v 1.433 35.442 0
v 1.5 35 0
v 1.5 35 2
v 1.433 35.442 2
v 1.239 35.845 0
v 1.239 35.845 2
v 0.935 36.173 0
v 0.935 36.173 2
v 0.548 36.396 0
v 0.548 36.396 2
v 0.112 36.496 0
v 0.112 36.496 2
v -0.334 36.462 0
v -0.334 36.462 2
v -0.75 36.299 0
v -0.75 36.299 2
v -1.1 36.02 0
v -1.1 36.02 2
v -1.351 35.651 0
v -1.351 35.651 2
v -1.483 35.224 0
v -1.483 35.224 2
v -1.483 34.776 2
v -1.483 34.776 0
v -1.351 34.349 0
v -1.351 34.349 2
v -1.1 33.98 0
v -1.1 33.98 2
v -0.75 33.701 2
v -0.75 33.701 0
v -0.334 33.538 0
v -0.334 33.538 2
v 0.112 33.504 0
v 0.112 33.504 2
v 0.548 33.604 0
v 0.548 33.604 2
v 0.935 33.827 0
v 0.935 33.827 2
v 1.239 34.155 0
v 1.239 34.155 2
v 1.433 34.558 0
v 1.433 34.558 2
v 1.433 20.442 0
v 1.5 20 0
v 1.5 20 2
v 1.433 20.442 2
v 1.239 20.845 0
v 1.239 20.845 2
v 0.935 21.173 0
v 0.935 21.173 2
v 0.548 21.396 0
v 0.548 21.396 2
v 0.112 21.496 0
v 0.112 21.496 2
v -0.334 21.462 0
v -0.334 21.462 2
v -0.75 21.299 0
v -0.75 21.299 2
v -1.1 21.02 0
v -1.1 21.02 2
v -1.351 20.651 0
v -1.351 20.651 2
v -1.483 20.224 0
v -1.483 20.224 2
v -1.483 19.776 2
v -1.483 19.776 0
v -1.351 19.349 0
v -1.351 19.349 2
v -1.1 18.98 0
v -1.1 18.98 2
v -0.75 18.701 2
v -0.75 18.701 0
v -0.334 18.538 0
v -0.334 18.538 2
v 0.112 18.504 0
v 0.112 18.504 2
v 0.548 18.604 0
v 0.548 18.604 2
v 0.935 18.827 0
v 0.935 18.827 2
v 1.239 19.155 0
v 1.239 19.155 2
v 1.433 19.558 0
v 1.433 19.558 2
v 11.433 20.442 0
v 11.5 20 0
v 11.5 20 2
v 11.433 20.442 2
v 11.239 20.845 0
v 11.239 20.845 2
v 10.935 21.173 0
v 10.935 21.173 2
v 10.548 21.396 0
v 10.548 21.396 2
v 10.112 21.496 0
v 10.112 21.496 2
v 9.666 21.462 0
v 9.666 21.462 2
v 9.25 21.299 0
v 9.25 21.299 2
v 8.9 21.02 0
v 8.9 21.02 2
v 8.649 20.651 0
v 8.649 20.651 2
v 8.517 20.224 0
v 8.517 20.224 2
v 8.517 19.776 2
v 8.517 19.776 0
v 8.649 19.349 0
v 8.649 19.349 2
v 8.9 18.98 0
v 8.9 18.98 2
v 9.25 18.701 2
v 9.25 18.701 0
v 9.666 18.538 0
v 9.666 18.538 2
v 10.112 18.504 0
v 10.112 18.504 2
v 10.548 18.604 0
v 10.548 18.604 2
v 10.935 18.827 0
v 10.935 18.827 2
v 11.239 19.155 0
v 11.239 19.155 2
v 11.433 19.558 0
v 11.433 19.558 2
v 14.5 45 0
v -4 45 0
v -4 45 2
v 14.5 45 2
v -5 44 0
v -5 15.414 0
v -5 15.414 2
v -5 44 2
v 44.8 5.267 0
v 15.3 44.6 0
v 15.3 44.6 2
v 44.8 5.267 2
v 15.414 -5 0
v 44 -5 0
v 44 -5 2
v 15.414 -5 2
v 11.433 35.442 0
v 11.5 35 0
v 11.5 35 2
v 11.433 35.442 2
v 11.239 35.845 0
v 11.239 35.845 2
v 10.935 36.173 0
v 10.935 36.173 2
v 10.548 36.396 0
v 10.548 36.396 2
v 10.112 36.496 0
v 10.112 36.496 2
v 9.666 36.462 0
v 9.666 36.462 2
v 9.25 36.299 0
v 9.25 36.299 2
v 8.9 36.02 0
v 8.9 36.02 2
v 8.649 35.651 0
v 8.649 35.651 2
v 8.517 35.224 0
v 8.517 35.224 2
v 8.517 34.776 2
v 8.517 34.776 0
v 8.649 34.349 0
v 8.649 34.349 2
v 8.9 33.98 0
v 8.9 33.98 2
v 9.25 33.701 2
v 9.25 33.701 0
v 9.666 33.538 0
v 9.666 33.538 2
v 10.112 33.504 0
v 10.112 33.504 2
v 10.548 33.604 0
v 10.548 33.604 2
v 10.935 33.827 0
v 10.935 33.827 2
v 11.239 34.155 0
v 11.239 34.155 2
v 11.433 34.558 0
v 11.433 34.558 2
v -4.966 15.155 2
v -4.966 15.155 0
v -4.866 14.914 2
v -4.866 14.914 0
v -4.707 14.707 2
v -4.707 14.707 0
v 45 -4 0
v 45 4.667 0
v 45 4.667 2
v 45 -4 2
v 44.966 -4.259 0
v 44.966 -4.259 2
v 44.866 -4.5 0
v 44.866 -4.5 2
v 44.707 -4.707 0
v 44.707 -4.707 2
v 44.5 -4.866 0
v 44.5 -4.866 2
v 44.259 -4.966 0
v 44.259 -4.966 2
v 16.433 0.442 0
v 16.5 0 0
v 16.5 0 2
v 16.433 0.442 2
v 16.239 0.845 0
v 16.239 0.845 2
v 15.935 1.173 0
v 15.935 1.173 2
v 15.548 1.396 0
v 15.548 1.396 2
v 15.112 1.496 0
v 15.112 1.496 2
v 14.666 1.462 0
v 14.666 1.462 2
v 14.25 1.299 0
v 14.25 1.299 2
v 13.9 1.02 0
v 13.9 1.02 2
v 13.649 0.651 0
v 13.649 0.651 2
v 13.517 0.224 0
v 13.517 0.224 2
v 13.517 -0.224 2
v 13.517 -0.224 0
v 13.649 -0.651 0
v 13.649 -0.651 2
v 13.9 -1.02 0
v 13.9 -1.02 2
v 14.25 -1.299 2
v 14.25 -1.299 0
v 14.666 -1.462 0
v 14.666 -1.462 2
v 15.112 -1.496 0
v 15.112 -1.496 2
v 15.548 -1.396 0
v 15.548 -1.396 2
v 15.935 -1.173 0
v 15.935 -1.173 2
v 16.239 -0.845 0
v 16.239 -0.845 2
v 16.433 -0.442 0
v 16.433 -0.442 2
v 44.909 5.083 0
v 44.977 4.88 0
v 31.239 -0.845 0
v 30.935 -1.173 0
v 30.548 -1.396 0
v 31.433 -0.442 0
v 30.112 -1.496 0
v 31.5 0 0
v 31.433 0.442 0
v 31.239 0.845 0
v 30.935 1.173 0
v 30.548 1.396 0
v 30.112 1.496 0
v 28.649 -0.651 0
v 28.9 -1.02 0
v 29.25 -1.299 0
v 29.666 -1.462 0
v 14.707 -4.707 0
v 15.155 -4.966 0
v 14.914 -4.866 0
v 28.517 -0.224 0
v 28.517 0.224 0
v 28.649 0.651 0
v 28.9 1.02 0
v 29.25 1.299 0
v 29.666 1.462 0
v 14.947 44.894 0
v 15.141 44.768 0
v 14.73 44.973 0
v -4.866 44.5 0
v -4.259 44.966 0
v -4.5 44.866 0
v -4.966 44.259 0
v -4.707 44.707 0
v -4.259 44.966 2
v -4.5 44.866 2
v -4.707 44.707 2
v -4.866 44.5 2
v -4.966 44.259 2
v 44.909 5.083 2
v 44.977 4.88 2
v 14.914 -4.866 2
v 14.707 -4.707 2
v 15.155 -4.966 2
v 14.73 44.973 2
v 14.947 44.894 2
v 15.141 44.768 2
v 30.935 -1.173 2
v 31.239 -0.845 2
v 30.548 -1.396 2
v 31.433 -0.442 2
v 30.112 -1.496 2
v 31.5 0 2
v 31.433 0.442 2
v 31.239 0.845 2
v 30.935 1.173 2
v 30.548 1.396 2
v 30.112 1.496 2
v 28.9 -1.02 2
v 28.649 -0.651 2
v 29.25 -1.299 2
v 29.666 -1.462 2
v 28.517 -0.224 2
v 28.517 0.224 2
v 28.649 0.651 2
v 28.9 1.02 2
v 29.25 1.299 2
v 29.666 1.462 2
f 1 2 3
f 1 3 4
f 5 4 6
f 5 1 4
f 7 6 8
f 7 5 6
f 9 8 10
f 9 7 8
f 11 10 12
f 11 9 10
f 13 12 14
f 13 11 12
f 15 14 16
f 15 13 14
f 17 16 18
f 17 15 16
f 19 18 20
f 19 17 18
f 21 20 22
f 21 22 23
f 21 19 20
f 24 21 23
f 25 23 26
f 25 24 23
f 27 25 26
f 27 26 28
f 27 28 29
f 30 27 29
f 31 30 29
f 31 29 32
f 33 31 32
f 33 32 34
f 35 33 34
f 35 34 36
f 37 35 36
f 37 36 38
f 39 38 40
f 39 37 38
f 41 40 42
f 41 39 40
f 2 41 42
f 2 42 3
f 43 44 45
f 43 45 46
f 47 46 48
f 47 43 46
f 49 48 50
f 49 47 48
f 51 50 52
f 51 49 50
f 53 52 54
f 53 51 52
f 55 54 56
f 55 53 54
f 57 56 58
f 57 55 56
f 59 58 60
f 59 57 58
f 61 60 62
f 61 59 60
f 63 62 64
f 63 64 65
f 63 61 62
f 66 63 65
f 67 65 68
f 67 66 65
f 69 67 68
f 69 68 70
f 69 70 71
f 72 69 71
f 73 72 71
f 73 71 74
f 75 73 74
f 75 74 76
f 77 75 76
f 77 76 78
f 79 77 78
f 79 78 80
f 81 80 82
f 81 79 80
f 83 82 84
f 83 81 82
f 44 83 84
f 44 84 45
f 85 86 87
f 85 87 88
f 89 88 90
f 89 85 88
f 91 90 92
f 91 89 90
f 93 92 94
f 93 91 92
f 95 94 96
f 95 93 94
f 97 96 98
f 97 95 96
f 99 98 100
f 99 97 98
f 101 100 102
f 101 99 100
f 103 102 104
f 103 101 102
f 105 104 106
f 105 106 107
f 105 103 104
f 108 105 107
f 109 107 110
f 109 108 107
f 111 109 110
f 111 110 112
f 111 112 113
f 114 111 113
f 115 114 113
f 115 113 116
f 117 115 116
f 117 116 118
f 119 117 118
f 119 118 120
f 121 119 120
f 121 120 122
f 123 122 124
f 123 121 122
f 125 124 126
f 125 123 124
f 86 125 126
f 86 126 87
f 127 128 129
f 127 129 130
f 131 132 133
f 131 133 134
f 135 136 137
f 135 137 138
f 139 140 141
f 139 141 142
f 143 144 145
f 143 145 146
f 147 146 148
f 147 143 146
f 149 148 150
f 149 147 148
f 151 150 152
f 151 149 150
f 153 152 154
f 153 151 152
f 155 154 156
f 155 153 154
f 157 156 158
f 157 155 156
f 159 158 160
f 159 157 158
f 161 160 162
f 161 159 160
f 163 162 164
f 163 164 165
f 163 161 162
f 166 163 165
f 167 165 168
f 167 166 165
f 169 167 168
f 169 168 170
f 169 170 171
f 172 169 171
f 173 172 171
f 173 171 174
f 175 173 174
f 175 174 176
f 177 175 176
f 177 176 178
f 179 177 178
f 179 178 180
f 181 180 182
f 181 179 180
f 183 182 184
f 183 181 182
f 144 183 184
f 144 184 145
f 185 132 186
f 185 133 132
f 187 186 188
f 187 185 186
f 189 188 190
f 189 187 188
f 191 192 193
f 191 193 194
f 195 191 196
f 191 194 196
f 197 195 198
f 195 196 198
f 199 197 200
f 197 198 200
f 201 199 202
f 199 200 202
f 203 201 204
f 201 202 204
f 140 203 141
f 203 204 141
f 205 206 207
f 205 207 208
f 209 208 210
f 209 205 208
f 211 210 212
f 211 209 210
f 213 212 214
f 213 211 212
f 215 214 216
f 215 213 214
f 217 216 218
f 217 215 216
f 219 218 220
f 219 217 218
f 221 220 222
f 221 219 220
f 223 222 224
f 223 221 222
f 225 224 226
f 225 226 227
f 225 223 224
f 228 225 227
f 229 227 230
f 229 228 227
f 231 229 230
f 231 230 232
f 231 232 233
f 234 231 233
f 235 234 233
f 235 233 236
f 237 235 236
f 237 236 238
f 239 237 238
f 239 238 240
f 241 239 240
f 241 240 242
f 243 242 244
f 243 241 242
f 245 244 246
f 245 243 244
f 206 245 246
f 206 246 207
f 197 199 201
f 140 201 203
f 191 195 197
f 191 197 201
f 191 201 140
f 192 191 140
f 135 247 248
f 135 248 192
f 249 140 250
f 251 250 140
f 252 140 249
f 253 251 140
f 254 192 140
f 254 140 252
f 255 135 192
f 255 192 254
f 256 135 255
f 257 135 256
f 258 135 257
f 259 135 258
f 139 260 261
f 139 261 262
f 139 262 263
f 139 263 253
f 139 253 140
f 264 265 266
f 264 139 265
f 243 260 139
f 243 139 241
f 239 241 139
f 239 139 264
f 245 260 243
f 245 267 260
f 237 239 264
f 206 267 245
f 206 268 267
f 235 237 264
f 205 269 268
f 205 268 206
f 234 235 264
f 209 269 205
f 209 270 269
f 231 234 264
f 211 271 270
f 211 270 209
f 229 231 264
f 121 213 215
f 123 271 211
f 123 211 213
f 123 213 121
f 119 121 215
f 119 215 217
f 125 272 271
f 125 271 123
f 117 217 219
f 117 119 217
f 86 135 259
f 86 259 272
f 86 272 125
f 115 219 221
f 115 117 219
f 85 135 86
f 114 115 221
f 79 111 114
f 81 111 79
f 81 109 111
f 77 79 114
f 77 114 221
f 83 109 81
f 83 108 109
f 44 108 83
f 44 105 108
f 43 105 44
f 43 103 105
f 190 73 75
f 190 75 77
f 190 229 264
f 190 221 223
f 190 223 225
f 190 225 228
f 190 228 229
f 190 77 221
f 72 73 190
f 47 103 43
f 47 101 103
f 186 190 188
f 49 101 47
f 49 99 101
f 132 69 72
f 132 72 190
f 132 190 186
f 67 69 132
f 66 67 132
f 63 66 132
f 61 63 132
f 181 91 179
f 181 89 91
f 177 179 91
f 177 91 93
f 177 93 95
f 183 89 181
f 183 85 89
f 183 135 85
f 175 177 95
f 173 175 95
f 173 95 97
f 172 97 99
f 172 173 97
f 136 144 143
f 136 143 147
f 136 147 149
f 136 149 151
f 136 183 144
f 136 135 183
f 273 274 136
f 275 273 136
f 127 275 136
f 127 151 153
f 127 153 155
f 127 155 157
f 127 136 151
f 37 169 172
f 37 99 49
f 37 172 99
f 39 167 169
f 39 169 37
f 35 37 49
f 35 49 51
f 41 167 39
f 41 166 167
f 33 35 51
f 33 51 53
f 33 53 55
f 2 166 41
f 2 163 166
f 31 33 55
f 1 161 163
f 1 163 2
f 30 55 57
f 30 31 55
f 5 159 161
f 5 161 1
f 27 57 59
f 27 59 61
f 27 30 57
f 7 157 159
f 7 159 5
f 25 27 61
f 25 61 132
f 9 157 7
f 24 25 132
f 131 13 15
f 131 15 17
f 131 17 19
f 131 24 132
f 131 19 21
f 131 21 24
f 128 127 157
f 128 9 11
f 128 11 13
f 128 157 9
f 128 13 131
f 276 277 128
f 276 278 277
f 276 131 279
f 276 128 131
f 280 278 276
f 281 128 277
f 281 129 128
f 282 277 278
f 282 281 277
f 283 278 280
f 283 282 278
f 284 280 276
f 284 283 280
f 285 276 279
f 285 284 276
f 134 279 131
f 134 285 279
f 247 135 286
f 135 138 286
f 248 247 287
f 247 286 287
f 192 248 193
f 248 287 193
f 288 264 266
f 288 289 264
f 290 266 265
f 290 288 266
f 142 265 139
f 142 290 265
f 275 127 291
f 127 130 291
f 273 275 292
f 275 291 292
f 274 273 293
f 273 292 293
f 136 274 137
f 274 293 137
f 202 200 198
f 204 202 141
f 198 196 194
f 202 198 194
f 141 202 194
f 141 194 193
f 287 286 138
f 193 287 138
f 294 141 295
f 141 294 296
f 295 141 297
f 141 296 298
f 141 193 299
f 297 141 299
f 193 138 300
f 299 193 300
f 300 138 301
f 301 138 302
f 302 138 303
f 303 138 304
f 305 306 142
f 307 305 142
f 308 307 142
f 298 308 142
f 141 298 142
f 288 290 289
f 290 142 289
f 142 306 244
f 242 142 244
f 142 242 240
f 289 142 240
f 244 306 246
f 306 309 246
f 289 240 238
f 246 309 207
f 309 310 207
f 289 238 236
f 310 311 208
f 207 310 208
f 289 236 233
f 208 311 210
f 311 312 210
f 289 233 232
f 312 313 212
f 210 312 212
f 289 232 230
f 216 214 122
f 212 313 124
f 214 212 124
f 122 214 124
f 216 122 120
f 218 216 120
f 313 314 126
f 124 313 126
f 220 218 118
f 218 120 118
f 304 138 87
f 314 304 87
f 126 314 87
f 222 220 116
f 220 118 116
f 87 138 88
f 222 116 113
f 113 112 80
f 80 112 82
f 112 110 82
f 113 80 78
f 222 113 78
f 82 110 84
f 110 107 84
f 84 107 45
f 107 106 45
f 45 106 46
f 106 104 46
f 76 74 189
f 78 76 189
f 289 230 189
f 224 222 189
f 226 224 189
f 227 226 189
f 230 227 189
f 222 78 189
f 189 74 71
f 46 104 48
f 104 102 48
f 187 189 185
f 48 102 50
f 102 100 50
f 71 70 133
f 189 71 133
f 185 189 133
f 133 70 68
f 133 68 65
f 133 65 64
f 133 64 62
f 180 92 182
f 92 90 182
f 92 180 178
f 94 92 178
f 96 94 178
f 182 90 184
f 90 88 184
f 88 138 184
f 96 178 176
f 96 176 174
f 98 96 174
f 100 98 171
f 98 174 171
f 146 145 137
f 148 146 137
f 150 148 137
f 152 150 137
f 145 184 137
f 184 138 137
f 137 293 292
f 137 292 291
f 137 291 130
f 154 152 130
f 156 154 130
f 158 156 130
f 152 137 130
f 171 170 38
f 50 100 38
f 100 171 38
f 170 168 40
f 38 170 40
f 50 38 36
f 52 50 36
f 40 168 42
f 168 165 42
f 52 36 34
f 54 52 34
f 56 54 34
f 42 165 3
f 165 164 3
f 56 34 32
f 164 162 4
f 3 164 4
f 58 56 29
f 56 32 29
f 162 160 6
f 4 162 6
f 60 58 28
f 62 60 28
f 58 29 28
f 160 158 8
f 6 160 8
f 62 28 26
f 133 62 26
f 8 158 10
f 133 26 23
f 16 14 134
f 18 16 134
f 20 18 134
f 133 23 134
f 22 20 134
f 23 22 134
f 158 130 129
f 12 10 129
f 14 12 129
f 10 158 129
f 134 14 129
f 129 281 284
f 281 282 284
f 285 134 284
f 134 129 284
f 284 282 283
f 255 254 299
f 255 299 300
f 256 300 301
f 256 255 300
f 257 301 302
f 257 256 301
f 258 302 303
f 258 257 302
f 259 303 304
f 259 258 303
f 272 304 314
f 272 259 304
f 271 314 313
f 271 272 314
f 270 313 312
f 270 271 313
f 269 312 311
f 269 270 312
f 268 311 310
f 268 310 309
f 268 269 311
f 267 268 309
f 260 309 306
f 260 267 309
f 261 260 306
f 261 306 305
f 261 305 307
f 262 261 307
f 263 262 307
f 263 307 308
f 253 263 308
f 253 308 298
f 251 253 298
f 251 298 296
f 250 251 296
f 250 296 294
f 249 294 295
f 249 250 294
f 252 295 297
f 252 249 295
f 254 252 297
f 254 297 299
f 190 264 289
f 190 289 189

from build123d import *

# Parameters (mm, degrees)
SKETCH_1_R      = 1.5
EXTRUDE_1_DEPTH = 2
FILLET_1_R      = 1


with BuildPart() as part:
    # 草图1 → 凸台-拉伸1 (new body)
    with BuildSketch(Plane.XY):
        Polygon((-5, 45), (15, 45), (45, 5), (45, -5), (15, -5), (-5, 15), align=None)
        with Locations((0, 35)):
            Circle(SKETCH_1_R, mode=Mode.SUBTRACT)
        with Locations((30, 0)):
            Circle(SKETCH_1_R, mode=Mode.SUBTRACT)
        with Locations((0, 20)):
            Circle(SKETCH_1_R, mode=Mode.SUBTRACT)
        with Locations((15, 0)):
            Circle(SKETCH_1_R, mode=Mode.SUBTRACT)
        with Locations((10, 35)):
            Circle(SKETCH_1_R, mode=Mode.SUBTRACT)
        with Locations((10, 20)):
            Circle(SKETCH_1_R, mode=Mode.SUBTRACT)
    extrude(amount=EXTRUDE_1_DEPTH)

    # 圆角1
    fillet_1_edges = [part.edges().sort_by_distance(p)[0] for p in [
        (-5, 45, 1),
        (15, 45, 1),
        (45, 5, 1),
        (45, -5, 1),
        (15, -5, 1),
        (-5, 15, 1),
    ]]
    fillet(fillet_1_edges, radius=FILLET_1_R)


solid = part.part
